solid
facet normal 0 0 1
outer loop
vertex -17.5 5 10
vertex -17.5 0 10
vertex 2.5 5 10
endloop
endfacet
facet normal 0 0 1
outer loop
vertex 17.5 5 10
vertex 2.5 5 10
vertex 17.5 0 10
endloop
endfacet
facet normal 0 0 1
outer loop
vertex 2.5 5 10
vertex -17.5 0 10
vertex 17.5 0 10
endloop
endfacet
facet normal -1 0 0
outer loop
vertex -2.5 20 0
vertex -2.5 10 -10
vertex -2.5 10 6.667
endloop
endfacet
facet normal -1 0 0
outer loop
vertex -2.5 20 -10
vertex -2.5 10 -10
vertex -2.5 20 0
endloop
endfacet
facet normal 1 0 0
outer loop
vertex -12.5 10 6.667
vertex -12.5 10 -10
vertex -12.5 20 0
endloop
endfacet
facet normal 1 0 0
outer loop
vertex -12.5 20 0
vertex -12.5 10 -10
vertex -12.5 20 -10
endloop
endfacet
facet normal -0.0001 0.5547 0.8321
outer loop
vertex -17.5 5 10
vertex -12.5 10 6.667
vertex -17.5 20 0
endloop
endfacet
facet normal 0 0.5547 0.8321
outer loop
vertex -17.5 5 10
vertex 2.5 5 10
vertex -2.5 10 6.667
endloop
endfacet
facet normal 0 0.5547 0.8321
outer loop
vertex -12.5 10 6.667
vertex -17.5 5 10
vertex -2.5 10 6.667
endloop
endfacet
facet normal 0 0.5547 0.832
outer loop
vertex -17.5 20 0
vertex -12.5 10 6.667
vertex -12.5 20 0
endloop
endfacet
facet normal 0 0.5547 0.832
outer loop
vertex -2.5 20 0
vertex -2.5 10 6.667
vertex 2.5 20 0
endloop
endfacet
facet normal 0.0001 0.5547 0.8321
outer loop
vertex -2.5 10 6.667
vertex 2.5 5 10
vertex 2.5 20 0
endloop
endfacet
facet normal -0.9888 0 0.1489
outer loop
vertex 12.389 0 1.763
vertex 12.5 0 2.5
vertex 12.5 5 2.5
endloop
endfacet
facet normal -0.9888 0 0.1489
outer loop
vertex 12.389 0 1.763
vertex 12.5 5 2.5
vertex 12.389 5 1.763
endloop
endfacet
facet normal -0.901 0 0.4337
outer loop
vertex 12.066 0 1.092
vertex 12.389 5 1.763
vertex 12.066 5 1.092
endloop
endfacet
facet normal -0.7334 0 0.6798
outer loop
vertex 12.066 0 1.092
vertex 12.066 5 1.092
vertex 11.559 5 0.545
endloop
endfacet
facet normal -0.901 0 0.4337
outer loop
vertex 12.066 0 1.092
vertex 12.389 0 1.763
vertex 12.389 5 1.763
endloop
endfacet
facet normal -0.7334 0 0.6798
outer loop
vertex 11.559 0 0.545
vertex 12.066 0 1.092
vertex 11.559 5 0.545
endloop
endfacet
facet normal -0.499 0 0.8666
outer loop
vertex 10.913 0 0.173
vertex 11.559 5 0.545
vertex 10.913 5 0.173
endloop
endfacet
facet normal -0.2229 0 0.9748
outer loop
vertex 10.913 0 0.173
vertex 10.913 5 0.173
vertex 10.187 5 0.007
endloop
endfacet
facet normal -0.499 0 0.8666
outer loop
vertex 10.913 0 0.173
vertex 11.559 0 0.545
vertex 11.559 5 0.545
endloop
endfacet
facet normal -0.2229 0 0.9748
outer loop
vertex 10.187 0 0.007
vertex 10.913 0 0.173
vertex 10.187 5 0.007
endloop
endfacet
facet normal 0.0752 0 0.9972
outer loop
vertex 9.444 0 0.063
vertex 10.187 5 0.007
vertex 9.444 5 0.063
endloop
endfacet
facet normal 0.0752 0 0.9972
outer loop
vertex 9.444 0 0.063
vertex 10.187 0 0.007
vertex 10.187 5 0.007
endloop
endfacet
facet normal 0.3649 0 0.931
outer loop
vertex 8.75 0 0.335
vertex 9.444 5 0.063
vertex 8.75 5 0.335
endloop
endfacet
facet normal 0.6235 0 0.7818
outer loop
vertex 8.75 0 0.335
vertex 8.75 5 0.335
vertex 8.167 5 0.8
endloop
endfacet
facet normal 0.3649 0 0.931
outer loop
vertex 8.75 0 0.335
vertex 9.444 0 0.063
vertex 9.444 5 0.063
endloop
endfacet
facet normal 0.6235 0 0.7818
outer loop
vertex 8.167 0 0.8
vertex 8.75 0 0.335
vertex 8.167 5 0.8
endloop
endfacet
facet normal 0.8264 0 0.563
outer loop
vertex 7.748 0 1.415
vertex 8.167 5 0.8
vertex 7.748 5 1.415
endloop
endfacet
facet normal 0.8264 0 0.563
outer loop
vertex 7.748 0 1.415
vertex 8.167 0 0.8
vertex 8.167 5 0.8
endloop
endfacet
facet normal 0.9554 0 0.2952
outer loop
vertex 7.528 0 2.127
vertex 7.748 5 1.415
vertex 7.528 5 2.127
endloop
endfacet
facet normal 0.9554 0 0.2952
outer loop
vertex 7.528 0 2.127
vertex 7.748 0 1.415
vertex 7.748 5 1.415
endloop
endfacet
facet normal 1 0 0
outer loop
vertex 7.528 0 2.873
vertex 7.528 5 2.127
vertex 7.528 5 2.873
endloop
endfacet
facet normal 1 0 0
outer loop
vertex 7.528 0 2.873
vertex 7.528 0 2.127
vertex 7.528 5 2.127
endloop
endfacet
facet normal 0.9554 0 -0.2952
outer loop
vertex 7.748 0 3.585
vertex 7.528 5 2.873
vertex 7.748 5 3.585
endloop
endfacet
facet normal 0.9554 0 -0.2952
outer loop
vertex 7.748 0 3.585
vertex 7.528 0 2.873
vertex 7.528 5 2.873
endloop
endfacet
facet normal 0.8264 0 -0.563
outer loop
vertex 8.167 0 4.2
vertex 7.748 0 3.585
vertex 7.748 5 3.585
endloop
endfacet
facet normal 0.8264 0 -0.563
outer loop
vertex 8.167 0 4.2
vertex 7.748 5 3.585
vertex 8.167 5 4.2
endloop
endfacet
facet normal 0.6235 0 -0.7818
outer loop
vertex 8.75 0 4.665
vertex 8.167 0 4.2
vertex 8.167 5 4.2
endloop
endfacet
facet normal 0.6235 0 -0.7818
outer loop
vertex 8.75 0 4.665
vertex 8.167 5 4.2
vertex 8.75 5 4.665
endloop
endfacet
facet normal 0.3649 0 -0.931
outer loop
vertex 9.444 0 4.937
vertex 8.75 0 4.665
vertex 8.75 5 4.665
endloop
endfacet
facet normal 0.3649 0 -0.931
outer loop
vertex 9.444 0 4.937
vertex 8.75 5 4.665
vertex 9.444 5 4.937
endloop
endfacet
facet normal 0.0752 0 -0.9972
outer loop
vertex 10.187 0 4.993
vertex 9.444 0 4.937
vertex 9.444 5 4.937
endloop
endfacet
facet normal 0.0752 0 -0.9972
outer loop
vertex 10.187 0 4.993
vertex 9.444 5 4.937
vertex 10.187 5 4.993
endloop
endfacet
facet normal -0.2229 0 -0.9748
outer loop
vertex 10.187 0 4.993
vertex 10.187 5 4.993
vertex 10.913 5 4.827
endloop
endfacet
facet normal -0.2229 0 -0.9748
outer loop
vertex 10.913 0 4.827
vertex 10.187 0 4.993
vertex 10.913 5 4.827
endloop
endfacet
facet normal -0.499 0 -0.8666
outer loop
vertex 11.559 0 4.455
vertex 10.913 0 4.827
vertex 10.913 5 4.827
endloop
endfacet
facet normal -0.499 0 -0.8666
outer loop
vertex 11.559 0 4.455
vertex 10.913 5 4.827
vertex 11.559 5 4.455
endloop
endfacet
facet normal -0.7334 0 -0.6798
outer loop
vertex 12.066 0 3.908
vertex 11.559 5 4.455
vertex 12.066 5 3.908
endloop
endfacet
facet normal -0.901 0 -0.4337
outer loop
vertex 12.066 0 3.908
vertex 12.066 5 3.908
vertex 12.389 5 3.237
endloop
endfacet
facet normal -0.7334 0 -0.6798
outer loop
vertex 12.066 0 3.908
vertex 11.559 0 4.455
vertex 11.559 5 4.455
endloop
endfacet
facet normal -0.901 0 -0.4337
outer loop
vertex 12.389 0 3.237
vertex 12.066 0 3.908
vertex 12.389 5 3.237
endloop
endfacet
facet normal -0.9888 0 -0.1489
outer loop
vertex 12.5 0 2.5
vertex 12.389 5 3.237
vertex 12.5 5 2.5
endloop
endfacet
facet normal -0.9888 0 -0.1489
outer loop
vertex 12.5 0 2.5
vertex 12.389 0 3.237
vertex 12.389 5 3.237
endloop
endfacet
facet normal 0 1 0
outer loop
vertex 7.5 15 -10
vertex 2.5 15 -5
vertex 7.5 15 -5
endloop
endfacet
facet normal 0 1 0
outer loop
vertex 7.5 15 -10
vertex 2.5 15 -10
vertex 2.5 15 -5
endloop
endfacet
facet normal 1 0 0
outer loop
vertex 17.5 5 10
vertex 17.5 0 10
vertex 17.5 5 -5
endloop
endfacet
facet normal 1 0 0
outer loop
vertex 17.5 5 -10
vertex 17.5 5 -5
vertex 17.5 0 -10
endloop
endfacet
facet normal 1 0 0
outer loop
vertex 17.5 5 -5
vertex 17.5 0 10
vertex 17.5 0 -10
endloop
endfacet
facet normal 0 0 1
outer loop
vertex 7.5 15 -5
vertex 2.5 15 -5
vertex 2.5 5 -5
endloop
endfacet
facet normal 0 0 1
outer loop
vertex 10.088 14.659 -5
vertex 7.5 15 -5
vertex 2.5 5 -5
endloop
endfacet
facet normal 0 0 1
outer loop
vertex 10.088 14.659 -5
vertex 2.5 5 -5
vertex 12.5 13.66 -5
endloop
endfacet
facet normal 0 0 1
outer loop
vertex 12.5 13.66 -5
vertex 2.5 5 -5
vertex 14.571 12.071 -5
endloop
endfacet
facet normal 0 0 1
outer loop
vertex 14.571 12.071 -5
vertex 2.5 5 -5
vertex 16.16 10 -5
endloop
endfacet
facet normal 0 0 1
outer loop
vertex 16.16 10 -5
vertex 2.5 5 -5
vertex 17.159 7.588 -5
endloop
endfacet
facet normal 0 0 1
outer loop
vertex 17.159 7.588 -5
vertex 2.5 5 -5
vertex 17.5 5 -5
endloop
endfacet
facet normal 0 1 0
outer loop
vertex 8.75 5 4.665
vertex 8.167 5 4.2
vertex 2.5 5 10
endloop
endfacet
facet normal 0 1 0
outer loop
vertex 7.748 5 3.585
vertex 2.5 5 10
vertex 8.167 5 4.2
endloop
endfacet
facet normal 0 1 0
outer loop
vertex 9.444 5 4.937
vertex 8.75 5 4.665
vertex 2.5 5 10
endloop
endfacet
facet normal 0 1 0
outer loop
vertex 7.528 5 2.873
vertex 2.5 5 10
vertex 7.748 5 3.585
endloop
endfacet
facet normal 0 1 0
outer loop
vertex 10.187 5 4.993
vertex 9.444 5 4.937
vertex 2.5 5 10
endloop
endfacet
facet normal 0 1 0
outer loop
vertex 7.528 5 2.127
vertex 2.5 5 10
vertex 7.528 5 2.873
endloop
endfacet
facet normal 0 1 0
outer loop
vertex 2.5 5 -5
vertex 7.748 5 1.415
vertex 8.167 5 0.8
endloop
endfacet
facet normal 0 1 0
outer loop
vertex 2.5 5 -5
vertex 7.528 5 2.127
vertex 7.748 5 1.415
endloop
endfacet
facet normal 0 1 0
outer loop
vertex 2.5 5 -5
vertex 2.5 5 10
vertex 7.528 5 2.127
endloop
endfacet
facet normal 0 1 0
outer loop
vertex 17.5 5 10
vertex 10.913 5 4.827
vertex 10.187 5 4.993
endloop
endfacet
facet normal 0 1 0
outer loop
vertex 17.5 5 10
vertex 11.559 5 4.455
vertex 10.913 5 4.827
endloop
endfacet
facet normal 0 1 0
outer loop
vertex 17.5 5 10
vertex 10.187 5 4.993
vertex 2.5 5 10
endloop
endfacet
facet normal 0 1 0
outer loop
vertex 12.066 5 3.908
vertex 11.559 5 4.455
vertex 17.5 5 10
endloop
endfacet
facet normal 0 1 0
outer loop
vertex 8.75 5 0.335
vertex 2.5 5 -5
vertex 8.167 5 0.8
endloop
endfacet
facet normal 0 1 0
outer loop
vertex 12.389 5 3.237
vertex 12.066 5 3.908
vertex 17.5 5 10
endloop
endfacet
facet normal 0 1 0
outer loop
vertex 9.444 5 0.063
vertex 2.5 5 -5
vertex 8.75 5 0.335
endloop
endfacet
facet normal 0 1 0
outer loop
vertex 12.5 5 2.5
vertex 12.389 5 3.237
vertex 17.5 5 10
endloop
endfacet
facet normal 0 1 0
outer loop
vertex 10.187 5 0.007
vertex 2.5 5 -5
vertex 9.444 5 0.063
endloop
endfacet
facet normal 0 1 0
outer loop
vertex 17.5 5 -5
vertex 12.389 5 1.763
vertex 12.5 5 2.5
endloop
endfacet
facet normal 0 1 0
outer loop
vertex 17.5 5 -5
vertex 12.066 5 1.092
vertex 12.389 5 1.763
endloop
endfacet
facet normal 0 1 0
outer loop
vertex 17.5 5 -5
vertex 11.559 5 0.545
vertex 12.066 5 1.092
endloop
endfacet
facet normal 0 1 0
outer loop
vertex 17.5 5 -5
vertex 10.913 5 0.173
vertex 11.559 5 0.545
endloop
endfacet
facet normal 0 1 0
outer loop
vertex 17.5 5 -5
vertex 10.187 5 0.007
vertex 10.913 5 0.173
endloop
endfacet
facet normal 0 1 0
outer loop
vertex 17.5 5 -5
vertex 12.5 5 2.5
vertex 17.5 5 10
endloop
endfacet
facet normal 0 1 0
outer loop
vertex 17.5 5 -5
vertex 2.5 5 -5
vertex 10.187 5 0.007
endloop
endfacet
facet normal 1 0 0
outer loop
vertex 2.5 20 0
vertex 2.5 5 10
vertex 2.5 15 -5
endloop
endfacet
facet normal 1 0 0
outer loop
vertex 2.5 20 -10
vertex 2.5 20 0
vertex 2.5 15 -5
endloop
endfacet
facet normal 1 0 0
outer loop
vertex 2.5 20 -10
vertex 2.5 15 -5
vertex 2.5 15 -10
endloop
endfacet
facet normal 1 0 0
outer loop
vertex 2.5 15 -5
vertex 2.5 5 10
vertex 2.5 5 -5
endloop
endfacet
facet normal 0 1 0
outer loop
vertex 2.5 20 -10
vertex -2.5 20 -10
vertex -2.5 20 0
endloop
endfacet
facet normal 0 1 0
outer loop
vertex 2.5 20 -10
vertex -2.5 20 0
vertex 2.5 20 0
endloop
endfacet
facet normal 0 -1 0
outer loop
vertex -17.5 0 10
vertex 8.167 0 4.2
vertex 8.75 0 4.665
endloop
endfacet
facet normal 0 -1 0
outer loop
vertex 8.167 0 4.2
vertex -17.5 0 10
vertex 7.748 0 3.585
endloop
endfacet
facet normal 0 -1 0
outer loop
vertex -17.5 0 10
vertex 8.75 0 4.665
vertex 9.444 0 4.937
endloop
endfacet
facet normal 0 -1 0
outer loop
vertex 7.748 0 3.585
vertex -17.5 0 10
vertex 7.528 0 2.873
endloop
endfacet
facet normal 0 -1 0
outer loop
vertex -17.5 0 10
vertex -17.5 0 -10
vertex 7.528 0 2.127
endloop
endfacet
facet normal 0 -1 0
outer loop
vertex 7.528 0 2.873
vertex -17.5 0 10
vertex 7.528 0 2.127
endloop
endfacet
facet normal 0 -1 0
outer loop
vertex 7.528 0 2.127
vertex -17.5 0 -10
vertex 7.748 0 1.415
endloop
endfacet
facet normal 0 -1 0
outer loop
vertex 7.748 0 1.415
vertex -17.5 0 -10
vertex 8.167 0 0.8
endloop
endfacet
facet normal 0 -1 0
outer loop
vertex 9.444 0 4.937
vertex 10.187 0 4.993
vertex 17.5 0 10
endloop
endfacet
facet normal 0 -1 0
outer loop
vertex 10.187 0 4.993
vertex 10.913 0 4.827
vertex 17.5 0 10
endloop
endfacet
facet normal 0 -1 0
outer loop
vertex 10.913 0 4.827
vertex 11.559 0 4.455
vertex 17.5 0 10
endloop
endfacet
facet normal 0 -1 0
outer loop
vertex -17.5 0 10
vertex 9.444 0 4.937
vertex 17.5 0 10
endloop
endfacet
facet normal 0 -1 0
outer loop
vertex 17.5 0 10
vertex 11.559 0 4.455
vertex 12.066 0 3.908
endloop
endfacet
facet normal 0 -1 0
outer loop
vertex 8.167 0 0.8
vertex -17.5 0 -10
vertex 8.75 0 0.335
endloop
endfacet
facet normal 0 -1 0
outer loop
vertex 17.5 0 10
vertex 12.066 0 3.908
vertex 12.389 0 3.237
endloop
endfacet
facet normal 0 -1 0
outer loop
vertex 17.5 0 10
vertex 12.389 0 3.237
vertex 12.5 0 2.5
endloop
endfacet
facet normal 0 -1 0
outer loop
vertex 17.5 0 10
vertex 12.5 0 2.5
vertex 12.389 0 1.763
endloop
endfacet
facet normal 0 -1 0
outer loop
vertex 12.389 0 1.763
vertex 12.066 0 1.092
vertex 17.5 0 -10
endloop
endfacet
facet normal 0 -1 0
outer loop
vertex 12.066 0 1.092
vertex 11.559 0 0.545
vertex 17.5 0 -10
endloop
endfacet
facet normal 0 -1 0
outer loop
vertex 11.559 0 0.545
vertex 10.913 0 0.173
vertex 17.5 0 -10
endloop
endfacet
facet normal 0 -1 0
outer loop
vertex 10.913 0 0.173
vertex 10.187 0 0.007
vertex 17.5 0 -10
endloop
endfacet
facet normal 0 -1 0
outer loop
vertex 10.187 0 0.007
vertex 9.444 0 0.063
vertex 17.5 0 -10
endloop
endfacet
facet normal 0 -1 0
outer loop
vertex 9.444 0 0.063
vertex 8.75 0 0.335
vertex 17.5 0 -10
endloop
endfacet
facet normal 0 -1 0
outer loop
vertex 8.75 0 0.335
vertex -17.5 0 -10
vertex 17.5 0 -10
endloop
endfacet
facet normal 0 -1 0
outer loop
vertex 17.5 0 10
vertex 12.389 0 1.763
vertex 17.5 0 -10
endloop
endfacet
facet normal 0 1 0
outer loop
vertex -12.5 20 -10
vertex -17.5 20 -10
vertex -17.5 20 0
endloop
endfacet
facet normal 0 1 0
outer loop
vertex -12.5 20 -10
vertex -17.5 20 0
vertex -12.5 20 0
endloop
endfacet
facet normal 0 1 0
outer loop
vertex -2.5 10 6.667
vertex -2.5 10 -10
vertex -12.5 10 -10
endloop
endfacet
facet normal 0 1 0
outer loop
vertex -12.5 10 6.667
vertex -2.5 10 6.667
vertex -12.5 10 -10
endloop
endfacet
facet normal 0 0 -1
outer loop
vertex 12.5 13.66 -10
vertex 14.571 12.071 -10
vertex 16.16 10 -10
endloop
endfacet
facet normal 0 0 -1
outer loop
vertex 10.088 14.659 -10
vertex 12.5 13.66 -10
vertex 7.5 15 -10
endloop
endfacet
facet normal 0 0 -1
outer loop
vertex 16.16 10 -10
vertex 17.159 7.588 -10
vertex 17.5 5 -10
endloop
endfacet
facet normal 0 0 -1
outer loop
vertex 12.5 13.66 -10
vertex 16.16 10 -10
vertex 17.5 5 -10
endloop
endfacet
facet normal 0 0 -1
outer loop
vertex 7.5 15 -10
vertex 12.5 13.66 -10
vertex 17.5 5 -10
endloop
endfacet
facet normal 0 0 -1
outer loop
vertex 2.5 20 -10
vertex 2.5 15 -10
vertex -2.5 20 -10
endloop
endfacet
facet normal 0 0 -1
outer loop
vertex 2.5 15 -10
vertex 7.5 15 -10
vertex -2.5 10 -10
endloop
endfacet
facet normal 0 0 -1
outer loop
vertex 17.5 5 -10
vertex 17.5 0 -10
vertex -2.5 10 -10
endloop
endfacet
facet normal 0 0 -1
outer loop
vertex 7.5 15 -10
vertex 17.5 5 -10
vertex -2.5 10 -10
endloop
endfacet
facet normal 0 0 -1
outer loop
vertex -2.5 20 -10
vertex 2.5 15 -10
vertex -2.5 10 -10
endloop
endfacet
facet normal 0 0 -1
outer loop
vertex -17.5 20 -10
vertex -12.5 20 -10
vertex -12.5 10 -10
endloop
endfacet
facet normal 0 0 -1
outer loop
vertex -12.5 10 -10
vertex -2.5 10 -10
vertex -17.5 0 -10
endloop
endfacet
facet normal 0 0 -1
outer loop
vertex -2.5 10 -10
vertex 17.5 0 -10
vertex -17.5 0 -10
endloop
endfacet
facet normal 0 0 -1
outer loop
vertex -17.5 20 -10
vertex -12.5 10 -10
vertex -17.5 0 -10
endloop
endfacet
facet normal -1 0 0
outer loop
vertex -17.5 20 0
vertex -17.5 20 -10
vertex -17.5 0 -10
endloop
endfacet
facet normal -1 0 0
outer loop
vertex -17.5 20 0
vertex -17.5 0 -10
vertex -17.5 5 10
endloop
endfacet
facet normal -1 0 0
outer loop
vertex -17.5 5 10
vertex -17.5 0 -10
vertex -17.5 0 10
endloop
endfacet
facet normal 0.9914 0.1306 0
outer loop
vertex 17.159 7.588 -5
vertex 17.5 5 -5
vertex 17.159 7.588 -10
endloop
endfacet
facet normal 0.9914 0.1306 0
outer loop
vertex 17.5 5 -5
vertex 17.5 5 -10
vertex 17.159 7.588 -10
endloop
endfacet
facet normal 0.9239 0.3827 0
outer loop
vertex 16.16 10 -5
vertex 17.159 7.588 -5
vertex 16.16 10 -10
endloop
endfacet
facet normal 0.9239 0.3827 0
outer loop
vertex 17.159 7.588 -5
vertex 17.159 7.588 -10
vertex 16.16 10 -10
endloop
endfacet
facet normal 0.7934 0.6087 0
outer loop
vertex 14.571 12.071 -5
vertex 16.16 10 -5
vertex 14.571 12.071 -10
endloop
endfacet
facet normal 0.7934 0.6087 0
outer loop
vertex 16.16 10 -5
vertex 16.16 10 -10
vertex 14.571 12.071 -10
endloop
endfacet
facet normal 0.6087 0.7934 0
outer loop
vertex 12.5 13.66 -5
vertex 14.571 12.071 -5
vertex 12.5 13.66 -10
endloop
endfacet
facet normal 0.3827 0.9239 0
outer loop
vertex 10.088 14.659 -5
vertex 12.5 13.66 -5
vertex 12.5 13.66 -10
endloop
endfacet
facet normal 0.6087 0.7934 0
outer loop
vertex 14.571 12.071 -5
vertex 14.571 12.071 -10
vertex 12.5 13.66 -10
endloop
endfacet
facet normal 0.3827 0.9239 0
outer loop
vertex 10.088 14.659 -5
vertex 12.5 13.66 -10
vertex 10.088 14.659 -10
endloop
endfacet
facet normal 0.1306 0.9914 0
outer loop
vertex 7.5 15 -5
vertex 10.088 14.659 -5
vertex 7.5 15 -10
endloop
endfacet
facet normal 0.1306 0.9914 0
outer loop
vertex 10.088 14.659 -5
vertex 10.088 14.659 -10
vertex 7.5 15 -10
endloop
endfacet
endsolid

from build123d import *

# Parameters (mm, degrees)
SKETCH_1_W          = 15
SKETCH_1_H          = 15
SKETCH_1_R          = 2.5
EXTRUDE_1_DEPTH     = 5
SKETCH_1_3_W        = 15
SKETCH_1_3_H        = 5
EXTRUDE_2_DEPTH     = 15
EXTRUDE_3_DEPTH     = 20
CUT_EXTRUDE_1_DEPTH = 20
SKETCH_3_W          = 10
SKETCH_3_H          = 10
CUT_EXTRUDE_2_DEPTH = 20
FILLET_1_R          = 10


with BuildPart() as part:
    # 草圖1 → 填料-伸長1 (new body)
    with BuildSketch(Plane(origin=(0, 0, 0), x_dir=(1, 0, 0), z_dir=(0, 1, 0))):
        with Locations((10, -2.5)):
            Rectangle(SKETCH_1_W, SKETCH_1_H)
        with Locations((10, -2.5)):
            Circle(SKETCH_1_R, mode=Mode.SUBTRACT)
    extrude(amount=EXTRUDE_1_DEPTH)

    # 草圖1<3> → 填料-伸長2 (add)
    with BuildSketch(Plane(origin=(0, 0, 0), x_dir=(1, 0, 0), z_dir=(0, 1, 0))):
        with Locations((10, 7.5)):
            Rectangle(SKETCH_1_3_W, SKETCH_1_3_H)
    extrude(amount=EXTRUDE_2_DEPTH)

    # 草圖1<4> → 填料-伸長3 (add)
    with BuildSketch(Plane(origin=(0, 0, 0), x_dir=(1, 0, 0), z_dir=(0, 1, 0))):
        Polygon((-17.5, 10), (-17.5, -10), (2.5, -10), (2.5, 5), (2.5, 10), align=None)
    extrude(amount=EXTRUDE_3_DEPTH)

    # 草圖2 → 除料-伸長1 (cut)
    with BuildSketch(Plane(origin=(2.5, 0, 0), x_dir=(0, 0, -1), z_dir=(1, 0, 0))):
        Polygon((-10, 5), (0, 20), (-10, 20), align=None)
    extrude(amount=-CUT_EXTRUDE_1_DEPTH, mode=Mode.SUBTRACT)

    # 草圖3 → 除料-伸長2 (cut)
    with BuildSketch(Plane(origin=(0, 0, -10), x_dir=(-1, 0, 0), z_dir=(0, 0, -1))):
        with Locations((7.5, 15)):
            Rectangle(SKETCH_3_W, SKETCH_3_H)
    extrude(amount=-CUT_EXTRUDE_2_DEPTH, mode=Mode.SUBTRACT)

    # 圓角1
    fillet_1_edges = [part.edges().sort_by_distance(p)[0] for p in [
        (17.5, 15, -7.5),
    ]]
    fillet(fillet_1_edges, radius=FILLET_1_R)


solid = part.part
